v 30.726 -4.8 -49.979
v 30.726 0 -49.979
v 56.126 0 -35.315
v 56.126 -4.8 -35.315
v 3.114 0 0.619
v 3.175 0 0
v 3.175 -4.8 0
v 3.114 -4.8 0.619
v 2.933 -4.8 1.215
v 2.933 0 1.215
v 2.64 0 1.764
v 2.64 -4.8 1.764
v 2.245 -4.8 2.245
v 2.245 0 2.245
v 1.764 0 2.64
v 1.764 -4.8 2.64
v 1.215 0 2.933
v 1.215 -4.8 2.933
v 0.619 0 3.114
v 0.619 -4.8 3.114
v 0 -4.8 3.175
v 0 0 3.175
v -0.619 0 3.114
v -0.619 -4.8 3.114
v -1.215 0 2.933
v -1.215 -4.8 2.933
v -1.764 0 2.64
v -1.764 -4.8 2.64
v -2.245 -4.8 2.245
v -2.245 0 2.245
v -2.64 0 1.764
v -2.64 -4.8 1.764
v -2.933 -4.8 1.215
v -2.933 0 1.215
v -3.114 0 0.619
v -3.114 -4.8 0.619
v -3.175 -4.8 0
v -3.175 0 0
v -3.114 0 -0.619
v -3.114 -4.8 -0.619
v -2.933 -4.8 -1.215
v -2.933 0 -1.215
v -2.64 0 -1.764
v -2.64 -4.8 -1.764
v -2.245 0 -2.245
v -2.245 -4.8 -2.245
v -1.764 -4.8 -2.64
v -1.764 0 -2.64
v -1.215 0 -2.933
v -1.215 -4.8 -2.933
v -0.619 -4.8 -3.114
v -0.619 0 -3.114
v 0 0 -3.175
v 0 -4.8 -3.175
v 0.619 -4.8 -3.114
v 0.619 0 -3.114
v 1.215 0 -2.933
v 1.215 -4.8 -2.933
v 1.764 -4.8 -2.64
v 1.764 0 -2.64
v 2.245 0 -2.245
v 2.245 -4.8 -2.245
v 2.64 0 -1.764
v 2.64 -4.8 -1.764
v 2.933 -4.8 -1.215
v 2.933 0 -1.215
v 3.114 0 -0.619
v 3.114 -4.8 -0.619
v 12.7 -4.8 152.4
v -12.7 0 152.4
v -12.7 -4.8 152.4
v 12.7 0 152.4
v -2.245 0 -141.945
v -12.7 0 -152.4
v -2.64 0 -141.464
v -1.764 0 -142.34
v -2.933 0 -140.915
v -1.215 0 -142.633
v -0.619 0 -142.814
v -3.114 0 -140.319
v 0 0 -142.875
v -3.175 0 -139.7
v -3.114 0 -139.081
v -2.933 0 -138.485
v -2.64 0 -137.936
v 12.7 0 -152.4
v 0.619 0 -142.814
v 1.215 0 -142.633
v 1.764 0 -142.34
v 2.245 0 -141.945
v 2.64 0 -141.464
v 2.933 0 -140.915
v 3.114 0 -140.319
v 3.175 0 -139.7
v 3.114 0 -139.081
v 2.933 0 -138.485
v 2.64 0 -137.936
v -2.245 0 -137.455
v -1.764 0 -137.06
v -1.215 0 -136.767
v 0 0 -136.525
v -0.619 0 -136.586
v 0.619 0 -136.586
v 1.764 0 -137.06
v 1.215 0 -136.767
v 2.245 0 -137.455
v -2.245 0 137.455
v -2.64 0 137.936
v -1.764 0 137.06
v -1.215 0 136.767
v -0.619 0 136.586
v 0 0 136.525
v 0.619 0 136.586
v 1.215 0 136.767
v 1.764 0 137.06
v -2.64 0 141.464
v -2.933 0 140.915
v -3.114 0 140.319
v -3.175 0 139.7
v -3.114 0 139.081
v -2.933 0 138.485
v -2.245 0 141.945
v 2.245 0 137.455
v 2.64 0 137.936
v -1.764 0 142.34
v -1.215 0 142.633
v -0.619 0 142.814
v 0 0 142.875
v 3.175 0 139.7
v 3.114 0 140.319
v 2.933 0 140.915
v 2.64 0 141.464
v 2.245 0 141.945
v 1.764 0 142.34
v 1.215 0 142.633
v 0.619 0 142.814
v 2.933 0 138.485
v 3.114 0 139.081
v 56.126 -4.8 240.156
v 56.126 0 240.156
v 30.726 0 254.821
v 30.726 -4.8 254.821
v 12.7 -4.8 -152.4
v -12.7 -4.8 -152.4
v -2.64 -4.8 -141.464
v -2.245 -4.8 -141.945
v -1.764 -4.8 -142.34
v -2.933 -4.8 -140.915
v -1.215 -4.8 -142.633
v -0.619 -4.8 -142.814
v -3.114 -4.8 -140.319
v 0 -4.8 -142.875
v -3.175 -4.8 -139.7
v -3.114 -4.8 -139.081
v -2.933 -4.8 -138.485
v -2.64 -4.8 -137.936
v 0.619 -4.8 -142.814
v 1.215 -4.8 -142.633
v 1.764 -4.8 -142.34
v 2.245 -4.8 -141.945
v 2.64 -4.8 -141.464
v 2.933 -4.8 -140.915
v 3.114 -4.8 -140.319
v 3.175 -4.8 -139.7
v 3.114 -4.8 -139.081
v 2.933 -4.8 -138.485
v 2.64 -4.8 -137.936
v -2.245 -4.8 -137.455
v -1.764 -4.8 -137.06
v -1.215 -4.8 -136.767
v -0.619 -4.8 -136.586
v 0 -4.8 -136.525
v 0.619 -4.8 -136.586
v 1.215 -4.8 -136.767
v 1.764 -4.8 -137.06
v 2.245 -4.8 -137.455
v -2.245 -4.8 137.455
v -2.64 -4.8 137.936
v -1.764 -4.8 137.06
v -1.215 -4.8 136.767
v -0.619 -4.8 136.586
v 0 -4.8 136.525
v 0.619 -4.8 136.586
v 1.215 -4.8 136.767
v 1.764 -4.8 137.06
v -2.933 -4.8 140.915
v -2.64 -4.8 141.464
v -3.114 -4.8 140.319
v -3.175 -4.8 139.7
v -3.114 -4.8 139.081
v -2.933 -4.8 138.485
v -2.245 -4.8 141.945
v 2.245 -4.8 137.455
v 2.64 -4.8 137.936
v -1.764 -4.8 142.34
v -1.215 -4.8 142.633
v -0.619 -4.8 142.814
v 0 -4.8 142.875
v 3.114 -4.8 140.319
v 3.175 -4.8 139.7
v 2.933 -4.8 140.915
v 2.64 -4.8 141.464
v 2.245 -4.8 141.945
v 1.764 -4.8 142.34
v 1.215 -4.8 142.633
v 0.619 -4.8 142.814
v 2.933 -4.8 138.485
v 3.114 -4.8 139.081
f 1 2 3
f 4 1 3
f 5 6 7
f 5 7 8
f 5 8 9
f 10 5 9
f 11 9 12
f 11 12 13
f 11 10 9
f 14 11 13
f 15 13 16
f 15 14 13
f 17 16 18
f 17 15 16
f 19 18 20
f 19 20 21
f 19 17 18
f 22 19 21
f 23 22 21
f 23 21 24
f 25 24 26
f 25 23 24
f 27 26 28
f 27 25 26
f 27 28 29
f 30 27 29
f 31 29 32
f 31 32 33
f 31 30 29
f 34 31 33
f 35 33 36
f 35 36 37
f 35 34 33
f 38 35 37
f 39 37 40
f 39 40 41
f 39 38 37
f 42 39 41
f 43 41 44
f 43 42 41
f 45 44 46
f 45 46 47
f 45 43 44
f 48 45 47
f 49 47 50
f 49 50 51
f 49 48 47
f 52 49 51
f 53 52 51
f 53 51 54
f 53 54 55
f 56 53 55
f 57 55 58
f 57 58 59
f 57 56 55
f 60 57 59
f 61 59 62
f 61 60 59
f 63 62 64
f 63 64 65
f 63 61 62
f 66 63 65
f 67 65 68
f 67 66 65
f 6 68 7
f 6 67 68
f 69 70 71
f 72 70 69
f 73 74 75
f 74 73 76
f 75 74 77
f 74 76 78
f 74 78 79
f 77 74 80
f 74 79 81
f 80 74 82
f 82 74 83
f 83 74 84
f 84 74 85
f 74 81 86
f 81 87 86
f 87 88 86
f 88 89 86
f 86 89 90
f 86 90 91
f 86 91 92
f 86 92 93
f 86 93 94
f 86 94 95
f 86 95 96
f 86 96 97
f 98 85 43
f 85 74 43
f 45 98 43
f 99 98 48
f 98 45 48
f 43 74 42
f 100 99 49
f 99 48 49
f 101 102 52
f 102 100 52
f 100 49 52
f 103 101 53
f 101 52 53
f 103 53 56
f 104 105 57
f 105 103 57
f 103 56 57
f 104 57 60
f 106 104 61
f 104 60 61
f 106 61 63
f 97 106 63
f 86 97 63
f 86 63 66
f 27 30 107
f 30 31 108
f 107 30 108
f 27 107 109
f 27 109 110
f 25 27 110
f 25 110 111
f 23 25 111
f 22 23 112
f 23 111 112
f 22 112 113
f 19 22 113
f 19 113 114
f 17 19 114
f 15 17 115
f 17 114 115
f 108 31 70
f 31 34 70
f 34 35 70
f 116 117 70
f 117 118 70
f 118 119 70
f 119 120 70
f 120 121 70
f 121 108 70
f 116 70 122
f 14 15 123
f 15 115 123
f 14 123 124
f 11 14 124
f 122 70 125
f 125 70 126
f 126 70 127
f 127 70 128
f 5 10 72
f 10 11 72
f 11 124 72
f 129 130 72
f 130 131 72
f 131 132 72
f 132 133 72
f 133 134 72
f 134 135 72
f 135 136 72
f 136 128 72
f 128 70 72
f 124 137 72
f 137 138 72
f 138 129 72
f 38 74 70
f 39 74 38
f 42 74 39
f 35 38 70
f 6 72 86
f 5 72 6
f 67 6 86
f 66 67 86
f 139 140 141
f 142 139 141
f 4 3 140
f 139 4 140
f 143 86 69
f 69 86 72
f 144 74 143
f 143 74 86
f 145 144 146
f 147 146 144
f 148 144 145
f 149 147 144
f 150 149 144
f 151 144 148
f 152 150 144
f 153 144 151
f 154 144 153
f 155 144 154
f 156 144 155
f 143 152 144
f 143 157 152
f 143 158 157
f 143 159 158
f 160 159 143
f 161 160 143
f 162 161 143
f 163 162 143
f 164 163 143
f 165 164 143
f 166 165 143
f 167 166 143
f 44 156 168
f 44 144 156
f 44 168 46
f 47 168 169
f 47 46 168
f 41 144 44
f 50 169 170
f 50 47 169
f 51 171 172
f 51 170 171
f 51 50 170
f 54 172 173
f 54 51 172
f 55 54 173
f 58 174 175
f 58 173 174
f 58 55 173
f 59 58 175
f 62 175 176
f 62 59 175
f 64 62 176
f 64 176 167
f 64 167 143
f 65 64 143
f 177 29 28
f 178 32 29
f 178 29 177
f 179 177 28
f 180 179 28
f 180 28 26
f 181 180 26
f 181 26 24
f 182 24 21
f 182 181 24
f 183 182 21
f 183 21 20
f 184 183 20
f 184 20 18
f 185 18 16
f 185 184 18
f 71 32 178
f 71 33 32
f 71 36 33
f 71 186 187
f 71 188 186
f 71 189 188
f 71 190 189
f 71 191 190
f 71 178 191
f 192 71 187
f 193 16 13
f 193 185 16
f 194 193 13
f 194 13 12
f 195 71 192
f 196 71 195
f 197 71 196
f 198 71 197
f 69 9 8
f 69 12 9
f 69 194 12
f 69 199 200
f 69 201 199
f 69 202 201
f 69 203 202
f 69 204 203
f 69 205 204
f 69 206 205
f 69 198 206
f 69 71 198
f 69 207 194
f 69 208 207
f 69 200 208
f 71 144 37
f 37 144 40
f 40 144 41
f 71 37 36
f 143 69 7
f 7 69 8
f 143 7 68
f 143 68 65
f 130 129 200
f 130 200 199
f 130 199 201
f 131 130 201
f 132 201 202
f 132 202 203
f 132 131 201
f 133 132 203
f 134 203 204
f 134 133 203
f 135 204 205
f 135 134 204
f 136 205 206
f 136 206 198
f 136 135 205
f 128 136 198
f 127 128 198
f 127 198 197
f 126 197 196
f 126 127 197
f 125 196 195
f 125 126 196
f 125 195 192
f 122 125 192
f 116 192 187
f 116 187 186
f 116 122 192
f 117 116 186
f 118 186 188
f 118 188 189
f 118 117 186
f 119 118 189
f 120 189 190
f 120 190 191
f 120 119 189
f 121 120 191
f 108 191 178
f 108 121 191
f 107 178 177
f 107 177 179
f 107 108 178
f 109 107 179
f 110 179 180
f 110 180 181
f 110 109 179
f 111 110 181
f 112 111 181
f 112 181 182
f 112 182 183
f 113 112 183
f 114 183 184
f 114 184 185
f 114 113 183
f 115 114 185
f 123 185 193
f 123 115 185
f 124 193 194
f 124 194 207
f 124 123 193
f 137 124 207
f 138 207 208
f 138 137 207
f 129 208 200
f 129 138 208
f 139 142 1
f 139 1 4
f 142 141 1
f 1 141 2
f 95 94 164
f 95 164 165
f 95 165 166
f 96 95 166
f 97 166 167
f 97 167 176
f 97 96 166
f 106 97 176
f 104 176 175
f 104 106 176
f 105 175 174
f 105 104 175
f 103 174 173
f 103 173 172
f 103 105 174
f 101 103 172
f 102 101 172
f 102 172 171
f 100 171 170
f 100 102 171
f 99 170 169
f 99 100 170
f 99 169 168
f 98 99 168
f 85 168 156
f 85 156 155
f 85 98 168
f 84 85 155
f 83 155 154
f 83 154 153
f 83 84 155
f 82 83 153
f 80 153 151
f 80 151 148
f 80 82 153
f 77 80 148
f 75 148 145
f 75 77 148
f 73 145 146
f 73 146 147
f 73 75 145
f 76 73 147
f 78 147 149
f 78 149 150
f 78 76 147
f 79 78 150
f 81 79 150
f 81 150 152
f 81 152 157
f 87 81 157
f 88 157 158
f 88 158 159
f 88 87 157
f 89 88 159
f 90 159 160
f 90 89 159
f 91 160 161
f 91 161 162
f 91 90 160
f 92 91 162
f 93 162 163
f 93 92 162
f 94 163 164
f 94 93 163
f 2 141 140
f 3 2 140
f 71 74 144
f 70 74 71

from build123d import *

# Parameters (mm, degrees)
F0_W     = 25.4
F0_H     = 304.8
F0_R     = 3.175
F1_DEPTH = 4.8
F3_DEPTH = 4.8


with BuildPart() as f1:
    # F0 (on Front) → F1 (new body)
    with BuildSketch(Plane.XZ):
        Rectangle(F0_W, F0_H)
        with Locations((0, -139.7)):
            Circle(F0_R, mode=Mode.SUBTRACT)
        Circle(F0_R, mode=Mode.SUBTRACT)
        with Locations((0, 139.7)):
            Circle(F0_R, mode=Mode.SUBTRACT)
    extrude(amount=F1_DEPTH)


with BuildPart() as f3:
    # F2 (on Front) → F3 (new body, through all)
    with BuildSketch(Plane.XZ):
        Polygon((56.126103, 240.155916), (30.726103, 254.820613), (30.726103, -49.979387), (56.126103, -35.31469), align=None)
    extrude(amount=F3_DEPTH)


solid = Compound([f1.part, f3.part])
